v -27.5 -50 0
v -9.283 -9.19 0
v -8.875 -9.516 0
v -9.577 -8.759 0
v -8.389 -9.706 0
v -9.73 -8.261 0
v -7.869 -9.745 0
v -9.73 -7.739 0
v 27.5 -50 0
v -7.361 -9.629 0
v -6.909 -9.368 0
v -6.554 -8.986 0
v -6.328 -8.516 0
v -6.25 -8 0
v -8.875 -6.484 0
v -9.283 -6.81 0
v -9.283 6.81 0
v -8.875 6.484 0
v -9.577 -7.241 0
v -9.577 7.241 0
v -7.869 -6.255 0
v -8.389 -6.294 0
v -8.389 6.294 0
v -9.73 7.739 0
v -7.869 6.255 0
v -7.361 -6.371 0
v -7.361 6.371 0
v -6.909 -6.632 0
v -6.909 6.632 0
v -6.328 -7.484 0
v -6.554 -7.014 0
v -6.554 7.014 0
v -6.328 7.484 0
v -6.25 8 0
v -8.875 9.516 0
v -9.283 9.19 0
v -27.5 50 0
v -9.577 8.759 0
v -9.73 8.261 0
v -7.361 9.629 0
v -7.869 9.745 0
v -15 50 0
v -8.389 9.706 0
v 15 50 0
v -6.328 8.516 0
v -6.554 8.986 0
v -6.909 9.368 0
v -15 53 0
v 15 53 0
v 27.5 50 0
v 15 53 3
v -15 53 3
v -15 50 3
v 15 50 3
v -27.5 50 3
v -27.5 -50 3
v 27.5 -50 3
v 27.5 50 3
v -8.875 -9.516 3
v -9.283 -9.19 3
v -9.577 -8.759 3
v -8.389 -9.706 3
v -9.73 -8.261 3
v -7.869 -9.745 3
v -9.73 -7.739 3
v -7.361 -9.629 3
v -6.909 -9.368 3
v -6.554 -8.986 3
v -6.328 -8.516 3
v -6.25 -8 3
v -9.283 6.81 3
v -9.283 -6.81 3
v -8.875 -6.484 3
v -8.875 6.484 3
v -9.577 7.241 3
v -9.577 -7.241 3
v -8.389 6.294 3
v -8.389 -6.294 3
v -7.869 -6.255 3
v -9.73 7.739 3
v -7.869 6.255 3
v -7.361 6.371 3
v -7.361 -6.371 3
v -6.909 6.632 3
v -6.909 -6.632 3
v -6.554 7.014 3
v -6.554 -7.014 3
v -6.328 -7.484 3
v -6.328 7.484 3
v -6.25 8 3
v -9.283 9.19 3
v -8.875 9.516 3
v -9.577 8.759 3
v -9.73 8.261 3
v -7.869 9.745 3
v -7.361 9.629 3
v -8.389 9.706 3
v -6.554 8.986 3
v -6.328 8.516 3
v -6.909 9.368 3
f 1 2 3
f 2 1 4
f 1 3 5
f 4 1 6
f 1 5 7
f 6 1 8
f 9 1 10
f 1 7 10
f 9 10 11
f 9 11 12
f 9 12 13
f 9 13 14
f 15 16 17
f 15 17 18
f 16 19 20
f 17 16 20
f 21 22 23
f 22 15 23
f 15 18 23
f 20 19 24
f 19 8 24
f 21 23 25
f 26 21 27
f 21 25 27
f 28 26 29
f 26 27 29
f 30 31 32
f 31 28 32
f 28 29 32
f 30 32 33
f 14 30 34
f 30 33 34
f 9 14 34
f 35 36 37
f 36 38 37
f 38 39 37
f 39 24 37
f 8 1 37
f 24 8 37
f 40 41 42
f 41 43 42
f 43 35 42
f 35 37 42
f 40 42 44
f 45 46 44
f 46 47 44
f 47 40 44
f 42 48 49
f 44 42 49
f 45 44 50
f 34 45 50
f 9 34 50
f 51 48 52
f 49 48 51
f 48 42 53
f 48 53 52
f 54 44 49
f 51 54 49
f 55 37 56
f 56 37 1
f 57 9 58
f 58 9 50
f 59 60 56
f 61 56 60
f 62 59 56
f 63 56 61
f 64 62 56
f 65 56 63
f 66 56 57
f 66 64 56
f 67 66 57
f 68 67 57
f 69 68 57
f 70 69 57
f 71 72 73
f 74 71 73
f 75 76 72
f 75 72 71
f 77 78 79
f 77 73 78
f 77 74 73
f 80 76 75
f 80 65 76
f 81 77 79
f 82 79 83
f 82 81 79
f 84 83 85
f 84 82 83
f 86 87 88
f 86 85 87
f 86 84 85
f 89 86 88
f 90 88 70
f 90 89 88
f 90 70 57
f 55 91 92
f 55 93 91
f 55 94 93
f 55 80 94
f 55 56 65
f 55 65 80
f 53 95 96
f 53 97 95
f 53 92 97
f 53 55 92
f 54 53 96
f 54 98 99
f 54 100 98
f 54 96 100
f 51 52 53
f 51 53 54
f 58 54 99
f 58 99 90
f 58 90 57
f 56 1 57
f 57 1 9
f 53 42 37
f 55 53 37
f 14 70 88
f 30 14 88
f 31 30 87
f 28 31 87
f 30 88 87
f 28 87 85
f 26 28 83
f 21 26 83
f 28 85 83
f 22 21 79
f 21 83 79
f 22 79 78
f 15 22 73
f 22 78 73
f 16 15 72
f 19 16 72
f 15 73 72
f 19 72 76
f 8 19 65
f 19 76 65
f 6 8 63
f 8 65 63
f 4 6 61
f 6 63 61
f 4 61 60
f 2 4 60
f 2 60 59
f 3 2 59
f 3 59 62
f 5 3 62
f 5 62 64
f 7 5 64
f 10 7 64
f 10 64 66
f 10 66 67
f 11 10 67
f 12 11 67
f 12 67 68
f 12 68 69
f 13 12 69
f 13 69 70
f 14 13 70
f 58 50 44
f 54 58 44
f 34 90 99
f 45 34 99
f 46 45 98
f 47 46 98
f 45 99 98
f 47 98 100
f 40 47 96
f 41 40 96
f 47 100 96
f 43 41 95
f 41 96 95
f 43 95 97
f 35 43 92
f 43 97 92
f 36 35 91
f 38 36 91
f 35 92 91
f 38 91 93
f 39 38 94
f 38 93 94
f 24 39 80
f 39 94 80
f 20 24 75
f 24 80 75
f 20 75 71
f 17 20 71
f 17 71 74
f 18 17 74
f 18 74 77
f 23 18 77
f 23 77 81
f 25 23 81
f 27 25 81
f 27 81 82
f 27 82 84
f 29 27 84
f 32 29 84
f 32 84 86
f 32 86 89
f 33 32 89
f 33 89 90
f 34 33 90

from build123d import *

# Parameters (mm, degrees)
SKETCH_1_W          = 30
SKETCH_1_H          = 3
EXTRUDE_1_DEPTH     = 3
SKETCH_2_R          = 1.75
CUT_EXTRUDE_1_DEPTH = 10


with BuildPart() as part:
    # Эскиз1 → Бобышка-Вытянуть1 (new body)
    with BuildSketch(Plane.XY):
        Polygon((-27.5, 50), (-27.5, -50), (27.5, -50), (27.5, 50), (15, 50), (15, 47), (-15, 47), (-15, 50), align=None)
        with Locations((0, 48.5)):
            Rectangle(SKETCH_1_W, SKETCH_1_H)
        with Locations((0, 51.5)):
            Rectangle(SKETCH_1_W, SKETCH_1_H)
    extrude(amount=EXTRUDE_1_DEPTH)

    # Эскиз2 → Вырез-Вытянуть1 (cut)
    with BuildSketch(Plane.XY.offset(3)):
        with Locations((-8, 8)):
            Circle(SKETCH_2_R)
        with Locations((-8, -8)):
            Circle(SKETCH_2_R)
    extrude(amount=-CUT_EXTRUDE_1_DEPTH, mode=Mode.SUBTRACT)


solid = part.part
